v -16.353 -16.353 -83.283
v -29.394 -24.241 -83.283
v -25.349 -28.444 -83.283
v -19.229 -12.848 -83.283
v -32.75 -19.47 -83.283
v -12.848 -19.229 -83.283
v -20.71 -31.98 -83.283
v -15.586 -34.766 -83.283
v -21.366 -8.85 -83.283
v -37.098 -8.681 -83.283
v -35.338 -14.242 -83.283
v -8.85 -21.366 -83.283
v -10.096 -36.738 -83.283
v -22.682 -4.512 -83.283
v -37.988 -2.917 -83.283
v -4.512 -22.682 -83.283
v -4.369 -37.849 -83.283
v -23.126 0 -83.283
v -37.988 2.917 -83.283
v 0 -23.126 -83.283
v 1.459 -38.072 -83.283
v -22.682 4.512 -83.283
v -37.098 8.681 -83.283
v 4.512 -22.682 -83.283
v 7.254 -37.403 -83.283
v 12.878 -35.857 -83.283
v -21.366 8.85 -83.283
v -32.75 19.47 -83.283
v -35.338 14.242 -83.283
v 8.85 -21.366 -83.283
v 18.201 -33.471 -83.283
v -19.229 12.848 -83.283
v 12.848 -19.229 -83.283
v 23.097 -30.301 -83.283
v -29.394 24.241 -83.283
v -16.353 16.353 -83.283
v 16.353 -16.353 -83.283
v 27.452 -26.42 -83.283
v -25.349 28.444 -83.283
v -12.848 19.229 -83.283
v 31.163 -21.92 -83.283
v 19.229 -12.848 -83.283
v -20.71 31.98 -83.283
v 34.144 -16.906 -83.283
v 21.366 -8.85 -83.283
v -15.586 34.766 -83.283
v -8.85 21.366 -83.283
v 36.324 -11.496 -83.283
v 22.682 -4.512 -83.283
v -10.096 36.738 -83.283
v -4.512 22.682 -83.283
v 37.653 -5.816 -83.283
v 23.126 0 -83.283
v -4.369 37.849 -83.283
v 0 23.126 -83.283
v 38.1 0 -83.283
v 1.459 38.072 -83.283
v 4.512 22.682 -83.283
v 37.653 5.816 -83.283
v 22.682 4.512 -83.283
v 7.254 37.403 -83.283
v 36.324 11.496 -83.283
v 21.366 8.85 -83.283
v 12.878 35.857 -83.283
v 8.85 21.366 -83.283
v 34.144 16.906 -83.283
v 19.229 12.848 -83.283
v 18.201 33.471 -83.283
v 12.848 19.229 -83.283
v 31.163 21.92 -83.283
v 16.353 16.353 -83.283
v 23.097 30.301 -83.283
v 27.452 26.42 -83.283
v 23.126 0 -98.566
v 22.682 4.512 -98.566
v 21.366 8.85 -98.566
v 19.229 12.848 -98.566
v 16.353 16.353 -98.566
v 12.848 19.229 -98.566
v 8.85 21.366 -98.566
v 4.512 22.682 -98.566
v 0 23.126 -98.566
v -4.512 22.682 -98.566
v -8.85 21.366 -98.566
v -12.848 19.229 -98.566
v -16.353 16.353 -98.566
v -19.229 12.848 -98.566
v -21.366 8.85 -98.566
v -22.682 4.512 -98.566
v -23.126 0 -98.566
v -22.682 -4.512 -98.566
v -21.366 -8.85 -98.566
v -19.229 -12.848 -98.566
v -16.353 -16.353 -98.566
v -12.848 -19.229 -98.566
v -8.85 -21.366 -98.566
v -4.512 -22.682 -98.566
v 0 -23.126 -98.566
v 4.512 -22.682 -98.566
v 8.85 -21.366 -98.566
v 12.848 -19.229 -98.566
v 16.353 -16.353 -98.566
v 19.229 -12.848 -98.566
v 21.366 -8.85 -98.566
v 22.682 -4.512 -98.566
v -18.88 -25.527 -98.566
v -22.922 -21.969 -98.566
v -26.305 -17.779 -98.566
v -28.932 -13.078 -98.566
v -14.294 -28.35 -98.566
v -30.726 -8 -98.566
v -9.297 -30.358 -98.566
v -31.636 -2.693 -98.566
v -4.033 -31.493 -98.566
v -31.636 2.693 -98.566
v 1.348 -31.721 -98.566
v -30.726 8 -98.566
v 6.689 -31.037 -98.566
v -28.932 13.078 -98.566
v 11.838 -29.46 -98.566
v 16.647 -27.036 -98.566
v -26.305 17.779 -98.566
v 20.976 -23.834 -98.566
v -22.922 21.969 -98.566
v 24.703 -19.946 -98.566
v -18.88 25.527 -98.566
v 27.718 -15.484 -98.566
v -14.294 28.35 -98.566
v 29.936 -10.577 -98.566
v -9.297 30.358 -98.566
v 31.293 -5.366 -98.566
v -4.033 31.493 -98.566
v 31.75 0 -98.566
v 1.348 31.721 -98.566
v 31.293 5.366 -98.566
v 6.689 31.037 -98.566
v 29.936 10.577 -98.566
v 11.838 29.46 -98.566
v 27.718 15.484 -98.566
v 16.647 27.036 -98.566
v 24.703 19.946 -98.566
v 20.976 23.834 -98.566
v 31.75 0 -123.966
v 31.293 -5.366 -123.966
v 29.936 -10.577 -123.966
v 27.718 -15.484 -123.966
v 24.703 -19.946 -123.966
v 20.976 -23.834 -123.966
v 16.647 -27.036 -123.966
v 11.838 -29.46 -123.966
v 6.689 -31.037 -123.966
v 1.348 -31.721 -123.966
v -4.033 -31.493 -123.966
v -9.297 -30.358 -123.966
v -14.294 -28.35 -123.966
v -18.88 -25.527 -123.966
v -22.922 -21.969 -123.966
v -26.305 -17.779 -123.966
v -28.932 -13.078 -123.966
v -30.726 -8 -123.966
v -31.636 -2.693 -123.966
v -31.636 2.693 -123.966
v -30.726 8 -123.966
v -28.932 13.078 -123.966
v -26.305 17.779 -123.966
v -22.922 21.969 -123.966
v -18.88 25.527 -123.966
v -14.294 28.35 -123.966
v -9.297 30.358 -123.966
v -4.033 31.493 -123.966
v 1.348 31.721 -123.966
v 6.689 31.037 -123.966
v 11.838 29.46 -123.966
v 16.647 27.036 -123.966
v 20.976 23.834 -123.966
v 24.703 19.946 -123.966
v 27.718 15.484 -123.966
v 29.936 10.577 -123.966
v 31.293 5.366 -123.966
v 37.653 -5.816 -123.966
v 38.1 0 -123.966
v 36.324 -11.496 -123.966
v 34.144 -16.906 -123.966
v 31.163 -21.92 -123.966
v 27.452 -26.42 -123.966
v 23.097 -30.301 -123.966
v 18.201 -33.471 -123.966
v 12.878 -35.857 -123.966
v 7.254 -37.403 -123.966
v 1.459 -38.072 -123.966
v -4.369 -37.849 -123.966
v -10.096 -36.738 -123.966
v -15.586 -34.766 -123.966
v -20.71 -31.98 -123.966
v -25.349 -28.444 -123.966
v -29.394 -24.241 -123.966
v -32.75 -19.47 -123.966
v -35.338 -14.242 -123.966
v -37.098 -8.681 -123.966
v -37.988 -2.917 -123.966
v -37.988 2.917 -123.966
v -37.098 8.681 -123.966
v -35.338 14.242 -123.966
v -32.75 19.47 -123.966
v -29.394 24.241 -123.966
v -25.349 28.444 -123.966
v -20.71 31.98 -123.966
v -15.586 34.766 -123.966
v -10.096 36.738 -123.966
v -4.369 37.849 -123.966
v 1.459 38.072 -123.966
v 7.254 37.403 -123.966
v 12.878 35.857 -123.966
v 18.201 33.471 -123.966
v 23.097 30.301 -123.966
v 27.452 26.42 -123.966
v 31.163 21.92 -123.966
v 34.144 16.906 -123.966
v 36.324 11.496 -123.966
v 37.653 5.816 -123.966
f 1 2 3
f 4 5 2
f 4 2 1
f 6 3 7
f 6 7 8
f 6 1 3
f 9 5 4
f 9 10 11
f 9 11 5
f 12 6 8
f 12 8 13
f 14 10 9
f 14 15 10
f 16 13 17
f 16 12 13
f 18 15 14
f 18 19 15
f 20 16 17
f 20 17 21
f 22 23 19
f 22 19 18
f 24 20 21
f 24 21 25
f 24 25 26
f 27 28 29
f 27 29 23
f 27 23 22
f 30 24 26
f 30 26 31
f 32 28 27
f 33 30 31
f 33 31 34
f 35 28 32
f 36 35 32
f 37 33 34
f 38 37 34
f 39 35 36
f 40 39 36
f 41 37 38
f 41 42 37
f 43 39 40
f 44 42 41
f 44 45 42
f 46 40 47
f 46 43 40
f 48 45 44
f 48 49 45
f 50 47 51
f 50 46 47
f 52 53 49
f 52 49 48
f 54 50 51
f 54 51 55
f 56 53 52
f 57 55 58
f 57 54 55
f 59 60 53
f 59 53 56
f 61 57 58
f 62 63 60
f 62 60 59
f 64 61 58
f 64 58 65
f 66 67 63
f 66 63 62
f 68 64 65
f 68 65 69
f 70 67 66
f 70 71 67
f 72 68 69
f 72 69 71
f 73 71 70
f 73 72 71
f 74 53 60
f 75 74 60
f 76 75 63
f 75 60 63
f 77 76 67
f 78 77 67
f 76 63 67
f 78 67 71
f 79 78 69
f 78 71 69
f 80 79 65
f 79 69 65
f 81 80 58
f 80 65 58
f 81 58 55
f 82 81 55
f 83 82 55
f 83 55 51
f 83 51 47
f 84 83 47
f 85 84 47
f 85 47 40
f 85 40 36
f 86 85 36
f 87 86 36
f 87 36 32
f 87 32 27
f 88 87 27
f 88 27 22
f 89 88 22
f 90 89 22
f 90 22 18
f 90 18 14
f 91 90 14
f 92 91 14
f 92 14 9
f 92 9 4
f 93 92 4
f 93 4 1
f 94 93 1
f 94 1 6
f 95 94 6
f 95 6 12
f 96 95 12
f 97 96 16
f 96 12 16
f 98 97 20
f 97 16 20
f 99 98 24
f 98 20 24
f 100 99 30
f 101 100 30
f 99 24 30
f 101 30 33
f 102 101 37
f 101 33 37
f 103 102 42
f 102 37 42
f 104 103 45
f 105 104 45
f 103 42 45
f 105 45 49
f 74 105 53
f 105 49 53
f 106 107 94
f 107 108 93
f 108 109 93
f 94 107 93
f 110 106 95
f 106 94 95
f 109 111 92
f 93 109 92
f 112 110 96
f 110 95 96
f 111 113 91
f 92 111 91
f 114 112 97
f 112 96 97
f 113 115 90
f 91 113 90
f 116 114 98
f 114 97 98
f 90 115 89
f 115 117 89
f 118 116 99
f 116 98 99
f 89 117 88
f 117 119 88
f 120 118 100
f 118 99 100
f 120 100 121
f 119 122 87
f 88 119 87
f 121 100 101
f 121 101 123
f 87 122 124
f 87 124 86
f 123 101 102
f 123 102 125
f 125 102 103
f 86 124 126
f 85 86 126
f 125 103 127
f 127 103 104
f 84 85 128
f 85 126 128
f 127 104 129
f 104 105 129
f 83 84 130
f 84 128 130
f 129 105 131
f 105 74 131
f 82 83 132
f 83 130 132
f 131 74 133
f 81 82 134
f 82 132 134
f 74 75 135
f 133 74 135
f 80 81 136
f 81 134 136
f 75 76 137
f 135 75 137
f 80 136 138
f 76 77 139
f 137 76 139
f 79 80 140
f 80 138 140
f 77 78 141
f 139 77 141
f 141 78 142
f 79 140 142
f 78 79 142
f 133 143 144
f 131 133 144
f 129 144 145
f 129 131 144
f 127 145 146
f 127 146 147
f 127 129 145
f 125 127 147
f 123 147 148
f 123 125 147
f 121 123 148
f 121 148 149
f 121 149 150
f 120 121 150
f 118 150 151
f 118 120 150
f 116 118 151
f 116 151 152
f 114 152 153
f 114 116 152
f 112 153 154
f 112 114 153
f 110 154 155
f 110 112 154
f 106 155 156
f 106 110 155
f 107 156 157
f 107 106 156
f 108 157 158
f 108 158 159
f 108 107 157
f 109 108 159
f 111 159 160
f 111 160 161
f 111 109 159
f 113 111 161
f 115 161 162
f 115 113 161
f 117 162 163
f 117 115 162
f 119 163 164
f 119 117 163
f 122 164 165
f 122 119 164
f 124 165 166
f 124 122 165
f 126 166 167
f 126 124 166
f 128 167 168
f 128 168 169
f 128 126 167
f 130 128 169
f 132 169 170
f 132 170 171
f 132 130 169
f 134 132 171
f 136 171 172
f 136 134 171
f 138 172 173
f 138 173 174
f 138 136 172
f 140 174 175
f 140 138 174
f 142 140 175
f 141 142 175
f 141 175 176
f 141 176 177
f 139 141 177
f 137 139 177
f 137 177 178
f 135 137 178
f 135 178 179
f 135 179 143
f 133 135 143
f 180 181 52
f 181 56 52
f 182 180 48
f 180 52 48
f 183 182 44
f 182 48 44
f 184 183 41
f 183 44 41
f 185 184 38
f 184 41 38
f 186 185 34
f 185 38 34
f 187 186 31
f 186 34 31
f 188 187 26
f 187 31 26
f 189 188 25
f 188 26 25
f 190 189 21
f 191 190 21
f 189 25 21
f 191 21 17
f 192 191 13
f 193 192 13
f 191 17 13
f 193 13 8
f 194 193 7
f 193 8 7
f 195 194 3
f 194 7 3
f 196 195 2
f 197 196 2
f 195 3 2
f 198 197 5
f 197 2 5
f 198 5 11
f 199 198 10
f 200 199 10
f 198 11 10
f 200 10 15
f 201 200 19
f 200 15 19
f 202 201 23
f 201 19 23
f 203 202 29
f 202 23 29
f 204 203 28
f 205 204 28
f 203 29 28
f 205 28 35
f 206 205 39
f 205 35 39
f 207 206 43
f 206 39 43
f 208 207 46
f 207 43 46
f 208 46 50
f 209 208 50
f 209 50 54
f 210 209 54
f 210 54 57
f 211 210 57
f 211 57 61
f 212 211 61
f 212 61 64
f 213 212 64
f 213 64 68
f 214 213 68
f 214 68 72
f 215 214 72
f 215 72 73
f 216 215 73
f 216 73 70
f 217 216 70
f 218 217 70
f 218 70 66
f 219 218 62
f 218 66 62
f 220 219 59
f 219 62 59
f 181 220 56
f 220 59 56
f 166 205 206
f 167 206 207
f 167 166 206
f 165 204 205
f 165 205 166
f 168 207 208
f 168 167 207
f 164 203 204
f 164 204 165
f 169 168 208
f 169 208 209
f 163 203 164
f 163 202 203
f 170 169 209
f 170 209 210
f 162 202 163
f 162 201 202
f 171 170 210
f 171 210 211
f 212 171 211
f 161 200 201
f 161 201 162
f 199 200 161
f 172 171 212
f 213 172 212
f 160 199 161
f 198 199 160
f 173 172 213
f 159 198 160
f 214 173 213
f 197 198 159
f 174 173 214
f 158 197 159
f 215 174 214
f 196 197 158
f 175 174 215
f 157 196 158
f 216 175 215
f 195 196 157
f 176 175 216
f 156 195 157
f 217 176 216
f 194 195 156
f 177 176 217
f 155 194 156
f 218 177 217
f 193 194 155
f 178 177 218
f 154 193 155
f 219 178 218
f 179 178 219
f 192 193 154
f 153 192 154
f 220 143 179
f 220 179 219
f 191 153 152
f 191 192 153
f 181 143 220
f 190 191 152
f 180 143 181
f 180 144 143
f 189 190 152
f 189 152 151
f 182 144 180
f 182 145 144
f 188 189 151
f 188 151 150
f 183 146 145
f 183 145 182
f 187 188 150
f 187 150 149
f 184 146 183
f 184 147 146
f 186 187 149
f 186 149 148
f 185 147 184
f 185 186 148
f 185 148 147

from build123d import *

# Parameters (mm, degrees)
F1_R     = 38.1
F2_DEPTH = 15.2828320861
F3_R     = 23.1262571724
F4_DEPTH = 25.4
F5_R     = 38.1
F5_R_2   = 31.75
F6_DEPTH = 25.4


# Not quite as in the source:
# - a feature names something its author has since deleted; it is built from what else it names


with BuildPart() as f2:
    # F1 (on offset) → F2 (new body)
    with BuildSketch(Plane.XY.offset(-83.2833182067)):
        Circle(F1_R)
    extrude(amount=-F2_DEPTH)

    # F3 (on face) → F4 (cut)
    with BuildSketch(Plane.XY.offset(-83.2833182067)):
        Circle(F3_R)
    extrude(amount=-F4_DEPTH, mode=Mode.SUBTRACT)

    # F5 (on face) → F6 (join)
    with BuildSketch(Plane(origin=(0, 0, -98.5661502928), x_dir=(1, 0, 0), z_dir=(0, 0, -1))):
        Circle(F5_R)
        Circle(F5_R_2, mode=Mode.SUBTRACT)
    extrude(amount=F6_DEPTH)


solid = f2.part
